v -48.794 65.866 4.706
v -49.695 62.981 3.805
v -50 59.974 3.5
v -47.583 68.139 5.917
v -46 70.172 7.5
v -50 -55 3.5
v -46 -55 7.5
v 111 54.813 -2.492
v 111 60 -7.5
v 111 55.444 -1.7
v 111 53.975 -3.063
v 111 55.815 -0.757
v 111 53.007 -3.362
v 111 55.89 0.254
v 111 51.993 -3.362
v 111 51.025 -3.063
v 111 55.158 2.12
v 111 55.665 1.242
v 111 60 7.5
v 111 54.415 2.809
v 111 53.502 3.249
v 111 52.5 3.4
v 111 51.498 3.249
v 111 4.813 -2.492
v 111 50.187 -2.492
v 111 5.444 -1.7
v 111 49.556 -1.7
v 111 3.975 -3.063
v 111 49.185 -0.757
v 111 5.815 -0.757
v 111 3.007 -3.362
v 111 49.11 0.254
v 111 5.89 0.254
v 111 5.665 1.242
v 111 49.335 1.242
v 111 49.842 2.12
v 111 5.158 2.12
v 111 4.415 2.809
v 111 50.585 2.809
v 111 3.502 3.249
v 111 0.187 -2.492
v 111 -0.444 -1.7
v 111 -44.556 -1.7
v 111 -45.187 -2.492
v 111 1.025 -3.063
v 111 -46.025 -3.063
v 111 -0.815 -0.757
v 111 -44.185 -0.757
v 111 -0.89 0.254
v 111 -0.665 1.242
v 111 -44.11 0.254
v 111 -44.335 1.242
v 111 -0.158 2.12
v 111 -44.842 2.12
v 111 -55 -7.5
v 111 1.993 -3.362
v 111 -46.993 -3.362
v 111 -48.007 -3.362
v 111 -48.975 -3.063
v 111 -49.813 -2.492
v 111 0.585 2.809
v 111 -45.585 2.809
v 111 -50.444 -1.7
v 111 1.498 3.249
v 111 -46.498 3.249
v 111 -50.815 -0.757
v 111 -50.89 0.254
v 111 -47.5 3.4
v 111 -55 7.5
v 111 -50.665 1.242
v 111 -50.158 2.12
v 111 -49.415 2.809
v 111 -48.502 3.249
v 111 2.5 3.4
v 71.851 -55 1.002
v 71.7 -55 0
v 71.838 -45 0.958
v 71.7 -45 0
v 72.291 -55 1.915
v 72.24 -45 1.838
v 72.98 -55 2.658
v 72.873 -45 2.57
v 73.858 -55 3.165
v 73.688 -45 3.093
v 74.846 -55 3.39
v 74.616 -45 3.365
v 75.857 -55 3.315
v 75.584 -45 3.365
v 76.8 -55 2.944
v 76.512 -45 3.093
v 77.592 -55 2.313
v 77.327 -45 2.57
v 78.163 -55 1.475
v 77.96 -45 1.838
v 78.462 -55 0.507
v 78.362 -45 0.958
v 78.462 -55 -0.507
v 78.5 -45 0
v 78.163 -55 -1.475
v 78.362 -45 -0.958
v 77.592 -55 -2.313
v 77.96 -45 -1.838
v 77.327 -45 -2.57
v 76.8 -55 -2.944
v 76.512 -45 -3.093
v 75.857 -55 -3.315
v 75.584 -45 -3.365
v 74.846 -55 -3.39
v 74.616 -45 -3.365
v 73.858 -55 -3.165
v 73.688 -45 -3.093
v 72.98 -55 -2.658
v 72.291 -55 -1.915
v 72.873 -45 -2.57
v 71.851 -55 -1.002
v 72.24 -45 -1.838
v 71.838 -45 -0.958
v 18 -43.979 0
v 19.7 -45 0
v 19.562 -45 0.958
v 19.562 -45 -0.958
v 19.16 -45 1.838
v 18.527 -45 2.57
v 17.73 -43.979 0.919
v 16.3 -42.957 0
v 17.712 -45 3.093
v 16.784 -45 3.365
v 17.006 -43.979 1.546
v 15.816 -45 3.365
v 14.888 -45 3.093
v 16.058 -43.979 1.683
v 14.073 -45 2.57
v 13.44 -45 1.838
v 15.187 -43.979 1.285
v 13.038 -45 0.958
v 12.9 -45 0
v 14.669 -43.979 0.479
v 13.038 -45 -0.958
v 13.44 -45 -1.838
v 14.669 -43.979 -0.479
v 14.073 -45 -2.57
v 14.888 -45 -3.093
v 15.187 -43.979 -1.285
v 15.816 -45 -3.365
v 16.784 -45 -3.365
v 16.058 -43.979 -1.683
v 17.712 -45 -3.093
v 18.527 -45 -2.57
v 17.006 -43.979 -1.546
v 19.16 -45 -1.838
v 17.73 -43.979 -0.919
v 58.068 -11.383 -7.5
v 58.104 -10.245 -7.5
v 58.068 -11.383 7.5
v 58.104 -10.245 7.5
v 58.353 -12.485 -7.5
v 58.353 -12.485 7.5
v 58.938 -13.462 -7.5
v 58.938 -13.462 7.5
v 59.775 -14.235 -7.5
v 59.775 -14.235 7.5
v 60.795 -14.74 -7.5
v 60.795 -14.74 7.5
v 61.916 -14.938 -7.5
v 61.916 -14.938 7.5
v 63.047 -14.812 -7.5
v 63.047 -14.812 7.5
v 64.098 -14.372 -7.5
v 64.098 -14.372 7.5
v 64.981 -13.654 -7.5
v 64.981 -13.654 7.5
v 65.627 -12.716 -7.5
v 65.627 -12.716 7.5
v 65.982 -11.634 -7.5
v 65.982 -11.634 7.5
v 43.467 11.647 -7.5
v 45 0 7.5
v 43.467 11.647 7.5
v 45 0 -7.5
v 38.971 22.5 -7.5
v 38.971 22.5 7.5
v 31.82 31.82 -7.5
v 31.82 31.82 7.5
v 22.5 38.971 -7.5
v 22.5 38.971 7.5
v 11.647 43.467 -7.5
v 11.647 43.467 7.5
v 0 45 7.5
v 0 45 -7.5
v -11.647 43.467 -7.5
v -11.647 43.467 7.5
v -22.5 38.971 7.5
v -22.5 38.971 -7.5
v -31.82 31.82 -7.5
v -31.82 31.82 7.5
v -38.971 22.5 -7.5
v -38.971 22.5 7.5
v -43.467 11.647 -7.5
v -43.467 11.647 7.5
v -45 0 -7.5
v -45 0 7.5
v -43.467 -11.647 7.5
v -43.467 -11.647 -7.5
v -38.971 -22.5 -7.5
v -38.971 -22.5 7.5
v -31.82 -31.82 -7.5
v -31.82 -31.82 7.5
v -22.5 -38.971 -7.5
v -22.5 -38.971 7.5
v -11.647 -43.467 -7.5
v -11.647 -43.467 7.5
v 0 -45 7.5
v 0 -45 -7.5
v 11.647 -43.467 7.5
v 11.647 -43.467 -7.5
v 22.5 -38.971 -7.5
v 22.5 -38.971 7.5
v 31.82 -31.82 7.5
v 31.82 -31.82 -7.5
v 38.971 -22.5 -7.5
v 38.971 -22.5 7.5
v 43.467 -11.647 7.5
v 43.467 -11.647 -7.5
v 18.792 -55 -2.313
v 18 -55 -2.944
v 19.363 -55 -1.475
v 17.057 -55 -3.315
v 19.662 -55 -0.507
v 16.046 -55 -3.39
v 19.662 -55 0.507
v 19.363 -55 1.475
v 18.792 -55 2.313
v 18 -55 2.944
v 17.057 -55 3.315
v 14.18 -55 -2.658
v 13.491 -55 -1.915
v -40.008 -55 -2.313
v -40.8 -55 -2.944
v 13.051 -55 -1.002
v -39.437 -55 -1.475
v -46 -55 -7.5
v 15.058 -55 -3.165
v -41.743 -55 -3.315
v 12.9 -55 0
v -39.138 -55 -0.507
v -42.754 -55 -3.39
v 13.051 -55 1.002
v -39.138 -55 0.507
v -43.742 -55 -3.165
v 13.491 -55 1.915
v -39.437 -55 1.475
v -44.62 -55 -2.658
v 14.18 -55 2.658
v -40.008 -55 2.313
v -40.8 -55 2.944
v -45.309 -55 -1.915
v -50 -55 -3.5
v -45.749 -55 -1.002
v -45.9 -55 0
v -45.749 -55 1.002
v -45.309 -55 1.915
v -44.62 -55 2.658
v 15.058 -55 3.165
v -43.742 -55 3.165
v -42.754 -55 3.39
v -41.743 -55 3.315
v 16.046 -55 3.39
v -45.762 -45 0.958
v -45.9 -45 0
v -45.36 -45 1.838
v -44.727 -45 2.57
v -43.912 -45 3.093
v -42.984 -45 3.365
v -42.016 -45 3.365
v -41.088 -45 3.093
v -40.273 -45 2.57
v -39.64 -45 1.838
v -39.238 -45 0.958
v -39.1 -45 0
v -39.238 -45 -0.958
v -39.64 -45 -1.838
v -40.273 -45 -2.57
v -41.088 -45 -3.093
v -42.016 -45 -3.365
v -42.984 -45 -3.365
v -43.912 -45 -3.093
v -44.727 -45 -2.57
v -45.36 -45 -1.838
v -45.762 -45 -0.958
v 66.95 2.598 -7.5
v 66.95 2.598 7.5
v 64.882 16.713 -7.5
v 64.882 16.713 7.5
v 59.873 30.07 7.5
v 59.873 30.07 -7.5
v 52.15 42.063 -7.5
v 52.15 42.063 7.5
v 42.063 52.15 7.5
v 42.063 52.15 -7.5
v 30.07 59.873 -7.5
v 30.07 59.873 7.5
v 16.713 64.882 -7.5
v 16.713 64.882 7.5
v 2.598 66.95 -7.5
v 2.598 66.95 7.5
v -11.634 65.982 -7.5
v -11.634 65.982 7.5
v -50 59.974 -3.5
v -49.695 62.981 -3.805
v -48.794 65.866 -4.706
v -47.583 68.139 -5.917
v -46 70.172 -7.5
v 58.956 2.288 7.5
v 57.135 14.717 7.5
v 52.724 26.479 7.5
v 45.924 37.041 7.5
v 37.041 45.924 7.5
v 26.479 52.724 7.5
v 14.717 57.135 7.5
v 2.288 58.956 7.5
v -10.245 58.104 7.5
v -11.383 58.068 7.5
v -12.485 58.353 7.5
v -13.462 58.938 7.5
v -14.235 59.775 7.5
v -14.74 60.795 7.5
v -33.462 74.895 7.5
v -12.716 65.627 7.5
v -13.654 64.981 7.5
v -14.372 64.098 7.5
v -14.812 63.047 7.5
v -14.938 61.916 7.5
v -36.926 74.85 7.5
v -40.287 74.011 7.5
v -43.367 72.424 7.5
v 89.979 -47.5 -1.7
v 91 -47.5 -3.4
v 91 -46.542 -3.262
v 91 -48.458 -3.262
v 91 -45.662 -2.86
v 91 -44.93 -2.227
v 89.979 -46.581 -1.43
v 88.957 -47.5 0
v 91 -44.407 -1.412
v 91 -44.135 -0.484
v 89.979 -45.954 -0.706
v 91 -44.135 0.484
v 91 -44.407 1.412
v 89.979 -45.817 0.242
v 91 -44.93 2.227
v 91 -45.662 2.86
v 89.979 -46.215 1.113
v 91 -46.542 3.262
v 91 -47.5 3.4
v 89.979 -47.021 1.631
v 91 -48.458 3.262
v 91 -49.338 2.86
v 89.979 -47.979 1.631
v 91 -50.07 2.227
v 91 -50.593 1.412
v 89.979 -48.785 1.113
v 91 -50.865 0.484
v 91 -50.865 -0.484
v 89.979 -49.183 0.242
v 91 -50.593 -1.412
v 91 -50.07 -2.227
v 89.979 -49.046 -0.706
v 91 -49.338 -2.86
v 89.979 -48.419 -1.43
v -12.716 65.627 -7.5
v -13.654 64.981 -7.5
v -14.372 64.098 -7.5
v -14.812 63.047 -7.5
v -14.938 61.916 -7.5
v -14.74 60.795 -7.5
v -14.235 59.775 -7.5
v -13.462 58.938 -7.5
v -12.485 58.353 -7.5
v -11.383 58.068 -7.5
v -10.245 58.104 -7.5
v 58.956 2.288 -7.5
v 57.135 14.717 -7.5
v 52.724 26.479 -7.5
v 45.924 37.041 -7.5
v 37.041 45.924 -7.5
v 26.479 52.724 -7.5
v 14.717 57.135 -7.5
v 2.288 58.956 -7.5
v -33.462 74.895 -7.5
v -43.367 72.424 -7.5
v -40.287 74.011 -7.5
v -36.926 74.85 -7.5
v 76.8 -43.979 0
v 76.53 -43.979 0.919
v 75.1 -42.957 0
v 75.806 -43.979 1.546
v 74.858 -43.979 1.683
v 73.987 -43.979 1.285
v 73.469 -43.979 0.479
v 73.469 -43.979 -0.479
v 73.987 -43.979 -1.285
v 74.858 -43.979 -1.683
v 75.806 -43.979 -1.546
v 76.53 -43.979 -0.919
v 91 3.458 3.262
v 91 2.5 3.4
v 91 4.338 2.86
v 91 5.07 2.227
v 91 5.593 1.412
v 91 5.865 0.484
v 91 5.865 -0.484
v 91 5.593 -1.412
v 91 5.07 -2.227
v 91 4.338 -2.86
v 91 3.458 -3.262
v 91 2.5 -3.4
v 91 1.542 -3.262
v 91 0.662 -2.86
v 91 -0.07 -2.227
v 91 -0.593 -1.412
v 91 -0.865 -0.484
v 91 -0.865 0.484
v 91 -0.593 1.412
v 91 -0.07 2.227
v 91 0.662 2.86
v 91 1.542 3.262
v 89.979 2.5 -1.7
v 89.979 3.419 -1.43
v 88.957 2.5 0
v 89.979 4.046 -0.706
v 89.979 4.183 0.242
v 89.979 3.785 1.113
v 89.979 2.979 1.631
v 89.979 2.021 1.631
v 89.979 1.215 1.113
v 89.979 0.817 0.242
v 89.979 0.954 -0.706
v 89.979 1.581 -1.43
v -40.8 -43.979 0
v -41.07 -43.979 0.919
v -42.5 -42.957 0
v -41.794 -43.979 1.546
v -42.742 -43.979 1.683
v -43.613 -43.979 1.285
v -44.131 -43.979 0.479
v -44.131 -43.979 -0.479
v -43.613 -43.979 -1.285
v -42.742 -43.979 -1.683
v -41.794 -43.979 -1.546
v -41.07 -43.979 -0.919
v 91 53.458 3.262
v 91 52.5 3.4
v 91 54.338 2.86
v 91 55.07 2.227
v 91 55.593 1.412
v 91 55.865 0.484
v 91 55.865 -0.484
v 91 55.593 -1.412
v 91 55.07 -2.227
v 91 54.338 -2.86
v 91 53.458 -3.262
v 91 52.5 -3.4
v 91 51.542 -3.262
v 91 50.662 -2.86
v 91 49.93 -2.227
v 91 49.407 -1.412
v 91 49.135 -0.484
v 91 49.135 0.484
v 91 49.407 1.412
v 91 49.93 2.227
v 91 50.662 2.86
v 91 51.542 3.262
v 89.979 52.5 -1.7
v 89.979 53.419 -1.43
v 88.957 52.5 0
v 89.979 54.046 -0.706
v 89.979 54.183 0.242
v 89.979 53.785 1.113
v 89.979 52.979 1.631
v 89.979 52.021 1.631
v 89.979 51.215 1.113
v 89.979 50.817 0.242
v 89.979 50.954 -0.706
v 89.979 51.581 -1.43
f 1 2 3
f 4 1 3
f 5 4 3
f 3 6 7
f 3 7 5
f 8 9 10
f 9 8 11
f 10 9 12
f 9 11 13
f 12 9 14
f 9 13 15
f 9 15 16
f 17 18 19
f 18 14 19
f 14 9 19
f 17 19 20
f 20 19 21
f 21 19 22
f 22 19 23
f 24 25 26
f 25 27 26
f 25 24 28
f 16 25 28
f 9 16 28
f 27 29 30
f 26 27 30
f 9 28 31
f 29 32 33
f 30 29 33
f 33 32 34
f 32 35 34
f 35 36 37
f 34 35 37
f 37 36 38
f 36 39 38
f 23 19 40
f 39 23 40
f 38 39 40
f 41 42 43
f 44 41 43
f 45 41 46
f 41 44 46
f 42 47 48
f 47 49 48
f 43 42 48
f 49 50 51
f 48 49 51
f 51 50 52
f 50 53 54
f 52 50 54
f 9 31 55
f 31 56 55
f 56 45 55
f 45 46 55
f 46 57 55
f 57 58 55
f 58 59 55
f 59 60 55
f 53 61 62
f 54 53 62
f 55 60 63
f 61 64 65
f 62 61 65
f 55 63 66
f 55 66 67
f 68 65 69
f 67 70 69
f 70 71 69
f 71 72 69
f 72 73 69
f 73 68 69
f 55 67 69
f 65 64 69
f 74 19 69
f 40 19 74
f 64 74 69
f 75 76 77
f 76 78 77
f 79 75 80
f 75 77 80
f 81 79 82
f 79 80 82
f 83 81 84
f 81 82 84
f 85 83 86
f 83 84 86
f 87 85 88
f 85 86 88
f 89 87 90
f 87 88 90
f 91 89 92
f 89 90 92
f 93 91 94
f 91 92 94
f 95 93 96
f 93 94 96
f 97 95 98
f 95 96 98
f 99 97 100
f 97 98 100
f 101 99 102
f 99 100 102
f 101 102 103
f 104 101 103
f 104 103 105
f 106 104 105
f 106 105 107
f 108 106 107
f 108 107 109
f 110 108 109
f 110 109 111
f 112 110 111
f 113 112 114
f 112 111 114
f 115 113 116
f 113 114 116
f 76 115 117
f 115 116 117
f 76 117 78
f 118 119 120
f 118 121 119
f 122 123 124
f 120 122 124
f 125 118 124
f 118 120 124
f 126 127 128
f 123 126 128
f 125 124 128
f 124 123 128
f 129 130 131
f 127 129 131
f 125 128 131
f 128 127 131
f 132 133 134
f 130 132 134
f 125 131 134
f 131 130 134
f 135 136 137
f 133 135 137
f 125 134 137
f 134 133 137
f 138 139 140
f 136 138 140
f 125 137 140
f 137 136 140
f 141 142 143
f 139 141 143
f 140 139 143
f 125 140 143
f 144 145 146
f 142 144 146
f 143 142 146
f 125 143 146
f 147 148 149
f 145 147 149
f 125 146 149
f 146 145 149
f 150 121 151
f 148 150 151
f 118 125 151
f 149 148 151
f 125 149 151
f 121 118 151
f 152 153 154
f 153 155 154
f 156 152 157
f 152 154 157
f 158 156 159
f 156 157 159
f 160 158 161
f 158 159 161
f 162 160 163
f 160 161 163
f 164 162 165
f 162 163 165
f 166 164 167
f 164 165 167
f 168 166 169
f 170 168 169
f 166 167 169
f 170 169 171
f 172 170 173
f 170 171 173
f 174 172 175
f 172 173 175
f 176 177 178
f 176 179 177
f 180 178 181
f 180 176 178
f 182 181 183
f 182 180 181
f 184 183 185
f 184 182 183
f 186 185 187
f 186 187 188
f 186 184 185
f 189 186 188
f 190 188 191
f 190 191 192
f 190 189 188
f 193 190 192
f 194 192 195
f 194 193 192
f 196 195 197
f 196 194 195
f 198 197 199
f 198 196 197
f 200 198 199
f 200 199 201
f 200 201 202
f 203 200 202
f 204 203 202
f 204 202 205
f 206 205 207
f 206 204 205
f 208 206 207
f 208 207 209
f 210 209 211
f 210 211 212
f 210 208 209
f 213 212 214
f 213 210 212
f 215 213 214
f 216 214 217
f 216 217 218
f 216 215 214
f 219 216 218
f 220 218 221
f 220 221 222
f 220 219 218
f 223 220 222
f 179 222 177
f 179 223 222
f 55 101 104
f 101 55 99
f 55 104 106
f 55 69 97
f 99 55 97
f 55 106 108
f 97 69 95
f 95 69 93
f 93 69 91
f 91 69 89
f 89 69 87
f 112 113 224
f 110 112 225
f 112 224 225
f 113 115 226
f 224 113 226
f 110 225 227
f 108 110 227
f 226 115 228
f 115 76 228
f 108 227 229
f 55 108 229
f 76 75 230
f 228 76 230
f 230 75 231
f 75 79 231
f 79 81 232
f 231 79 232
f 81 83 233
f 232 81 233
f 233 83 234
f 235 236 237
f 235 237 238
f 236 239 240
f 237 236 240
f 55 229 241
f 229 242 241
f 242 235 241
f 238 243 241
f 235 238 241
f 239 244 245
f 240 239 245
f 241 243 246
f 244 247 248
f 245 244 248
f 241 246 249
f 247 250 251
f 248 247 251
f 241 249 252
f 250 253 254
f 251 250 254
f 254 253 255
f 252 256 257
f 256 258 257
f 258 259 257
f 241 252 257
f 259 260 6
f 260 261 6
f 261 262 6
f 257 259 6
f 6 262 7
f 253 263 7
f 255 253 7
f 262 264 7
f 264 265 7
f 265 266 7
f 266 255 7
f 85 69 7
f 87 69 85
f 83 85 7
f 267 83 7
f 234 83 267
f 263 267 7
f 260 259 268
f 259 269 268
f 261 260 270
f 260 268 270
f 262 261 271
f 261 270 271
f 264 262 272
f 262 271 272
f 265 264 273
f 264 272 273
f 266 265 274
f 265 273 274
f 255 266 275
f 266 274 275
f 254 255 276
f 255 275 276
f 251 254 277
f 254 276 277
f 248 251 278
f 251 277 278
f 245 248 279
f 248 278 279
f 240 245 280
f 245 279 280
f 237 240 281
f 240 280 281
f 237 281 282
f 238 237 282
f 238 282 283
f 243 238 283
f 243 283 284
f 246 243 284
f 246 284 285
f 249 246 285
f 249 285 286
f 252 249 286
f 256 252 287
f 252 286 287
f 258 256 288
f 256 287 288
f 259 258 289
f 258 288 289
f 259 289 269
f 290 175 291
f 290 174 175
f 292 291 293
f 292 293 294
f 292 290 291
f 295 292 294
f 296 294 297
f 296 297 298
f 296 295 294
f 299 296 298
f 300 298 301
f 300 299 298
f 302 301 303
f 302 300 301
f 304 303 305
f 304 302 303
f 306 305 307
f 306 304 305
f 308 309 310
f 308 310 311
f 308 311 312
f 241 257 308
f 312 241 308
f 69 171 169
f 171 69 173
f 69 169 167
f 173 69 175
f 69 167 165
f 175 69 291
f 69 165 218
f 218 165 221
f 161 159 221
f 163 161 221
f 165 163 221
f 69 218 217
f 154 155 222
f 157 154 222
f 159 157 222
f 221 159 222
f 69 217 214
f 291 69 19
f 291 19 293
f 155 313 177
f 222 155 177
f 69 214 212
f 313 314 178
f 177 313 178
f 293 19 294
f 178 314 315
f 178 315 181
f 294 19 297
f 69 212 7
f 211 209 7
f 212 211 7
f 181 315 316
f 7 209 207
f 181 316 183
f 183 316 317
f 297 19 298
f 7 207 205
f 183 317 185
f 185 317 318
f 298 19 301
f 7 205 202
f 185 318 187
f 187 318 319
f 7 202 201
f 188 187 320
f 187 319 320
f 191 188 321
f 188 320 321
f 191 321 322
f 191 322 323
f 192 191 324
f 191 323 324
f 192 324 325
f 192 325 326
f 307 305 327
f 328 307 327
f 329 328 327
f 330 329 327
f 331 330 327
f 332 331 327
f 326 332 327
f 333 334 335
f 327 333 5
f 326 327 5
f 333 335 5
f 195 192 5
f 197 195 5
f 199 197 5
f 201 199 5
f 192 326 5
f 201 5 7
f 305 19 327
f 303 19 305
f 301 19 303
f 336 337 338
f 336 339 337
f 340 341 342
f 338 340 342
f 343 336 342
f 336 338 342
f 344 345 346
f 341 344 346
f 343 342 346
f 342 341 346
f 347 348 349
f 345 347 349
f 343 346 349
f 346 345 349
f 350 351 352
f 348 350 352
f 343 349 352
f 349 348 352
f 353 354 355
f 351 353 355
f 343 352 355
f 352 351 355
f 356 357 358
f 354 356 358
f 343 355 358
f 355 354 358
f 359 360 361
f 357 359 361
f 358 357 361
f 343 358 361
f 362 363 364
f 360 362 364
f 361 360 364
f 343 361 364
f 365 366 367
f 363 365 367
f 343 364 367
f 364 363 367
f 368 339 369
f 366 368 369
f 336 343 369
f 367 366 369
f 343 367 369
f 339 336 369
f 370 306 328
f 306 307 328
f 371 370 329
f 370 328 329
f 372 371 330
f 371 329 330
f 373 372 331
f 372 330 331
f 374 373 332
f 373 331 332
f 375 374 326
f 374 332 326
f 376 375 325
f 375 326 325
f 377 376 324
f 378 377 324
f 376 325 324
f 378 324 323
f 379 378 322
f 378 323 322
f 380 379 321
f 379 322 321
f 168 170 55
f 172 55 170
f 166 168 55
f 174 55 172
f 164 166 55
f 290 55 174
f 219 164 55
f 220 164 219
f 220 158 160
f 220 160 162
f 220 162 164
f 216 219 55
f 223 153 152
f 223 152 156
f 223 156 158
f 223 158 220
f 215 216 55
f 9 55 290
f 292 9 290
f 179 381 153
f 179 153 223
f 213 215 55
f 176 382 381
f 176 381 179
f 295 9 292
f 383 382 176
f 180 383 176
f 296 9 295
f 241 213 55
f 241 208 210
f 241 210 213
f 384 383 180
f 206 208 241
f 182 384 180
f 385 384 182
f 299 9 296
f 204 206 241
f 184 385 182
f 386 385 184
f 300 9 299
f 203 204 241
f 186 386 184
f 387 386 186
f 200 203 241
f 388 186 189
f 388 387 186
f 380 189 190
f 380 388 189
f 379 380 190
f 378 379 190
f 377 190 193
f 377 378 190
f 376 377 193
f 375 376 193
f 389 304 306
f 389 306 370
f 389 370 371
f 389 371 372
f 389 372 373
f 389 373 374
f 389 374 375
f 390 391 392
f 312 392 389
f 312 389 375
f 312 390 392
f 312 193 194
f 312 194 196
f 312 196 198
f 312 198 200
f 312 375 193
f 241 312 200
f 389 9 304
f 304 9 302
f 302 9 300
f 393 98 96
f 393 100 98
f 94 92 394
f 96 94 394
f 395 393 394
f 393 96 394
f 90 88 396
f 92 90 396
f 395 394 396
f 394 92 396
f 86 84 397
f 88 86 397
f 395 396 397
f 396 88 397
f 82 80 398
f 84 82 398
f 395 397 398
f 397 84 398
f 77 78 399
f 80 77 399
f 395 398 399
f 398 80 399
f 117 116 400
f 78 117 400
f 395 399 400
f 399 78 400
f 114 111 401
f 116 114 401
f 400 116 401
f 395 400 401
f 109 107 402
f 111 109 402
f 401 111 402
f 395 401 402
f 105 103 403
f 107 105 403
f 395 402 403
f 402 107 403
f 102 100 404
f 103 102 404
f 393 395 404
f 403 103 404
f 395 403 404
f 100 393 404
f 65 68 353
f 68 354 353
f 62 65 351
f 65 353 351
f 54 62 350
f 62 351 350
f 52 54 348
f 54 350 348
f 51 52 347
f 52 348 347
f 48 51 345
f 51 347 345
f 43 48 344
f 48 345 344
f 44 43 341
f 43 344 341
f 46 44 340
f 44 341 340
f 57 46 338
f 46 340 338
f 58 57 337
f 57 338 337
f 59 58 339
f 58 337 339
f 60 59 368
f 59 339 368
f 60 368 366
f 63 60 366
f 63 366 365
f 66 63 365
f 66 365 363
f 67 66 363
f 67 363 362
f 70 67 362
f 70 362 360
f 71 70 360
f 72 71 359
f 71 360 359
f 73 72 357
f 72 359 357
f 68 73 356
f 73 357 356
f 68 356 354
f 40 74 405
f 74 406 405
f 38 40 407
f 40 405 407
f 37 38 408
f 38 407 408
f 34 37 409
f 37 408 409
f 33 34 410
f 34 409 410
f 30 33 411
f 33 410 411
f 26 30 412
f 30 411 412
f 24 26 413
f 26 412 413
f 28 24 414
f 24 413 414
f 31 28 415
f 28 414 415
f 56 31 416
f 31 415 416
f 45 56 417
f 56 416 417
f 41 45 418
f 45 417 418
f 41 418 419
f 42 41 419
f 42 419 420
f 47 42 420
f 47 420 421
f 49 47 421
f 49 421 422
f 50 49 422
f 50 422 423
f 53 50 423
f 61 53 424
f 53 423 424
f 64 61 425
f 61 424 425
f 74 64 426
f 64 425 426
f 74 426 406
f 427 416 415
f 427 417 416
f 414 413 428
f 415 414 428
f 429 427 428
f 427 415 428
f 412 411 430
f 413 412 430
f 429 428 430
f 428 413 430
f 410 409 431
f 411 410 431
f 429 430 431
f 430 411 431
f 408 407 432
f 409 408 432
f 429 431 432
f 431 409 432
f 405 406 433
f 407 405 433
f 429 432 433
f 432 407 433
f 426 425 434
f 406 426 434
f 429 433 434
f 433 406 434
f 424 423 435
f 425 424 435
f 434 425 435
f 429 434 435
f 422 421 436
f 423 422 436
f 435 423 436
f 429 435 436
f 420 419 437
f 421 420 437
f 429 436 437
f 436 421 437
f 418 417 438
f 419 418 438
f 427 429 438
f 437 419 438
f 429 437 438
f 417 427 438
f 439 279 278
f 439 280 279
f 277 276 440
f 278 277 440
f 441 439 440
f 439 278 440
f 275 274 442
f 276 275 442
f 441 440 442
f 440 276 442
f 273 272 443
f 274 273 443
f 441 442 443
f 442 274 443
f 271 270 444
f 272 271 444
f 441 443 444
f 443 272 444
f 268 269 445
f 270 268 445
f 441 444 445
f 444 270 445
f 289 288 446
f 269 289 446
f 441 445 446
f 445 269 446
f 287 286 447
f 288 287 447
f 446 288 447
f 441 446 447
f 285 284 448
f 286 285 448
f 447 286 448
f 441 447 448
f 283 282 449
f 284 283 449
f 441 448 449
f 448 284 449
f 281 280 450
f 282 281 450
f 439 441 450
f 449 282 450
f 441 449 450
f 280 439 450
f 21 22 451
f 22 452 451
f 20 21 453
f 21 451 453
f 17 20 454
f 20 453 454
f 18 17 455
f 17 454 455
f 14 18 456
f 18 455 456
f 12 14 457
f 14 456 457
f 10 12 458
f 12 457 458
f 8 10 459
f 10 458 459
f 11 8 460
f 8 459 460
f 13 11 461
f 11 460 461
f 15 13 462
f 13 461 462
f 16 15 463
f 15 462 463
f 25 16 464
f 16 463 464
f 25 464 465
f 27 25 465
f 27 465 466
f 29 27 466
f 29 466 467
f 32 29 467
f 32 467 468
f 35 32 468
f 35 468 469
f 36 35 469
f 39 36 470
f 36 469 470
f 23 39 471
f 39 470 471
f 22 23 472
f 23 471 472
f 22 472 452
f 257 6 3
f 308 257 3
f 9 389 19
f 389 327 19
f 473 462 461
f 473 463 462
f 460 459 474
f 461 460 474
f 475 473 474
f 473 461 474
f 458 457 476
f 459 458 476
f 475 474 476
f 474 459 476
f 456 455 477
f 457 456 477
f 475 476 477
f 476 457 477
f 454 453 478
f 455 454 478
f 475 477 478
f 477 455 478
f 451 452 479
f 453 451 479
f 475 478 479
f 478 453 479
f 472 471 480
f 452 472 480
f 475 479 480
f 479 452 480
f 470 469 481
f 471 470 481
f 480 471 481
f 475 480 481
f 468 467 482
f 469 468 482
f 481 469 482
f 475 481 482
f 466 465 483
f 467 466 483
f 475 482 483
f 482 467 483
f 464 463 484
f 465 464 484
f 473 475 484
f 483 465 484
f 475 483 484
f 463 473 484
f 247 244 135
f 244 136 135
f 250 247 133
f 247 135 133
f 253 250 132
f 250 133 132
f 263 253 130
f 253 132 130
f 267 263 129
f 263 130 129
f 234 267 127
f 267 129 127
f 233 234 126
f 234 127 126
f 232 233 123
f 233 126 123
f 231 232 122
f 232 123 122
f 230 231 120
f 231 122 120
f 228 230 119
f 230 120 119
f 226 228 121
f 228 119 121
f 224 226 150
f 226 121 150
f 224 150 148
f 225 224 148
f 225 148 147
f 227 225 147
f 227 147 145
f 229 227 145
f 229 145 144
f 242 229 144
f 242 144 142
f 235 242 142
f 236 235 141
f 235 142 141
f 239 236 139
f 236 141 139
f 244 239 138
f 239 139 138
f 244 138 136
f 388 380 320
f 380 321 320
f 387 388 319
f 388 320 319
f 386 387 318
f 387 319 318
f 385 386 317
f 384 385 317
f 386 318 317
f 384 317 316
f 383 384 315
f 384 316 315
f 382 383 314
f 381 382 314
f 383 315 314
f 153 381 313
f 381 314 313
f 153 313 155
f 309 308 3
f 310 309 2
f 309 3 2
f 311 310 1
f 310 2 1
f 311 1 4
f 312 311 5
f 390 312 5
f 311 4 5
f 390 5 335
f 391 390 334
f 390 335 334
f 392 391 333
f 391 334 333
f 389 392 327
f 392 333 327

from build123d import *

# Parameters (mm, degrees)
CROQUIS1_R                = 45
SALIENTE_EXTRUIR1_DEPTH   = 7.5
TALADRO_ROSCADO_M81_D     = 6.8
TALADRO_ROSCADO_M81_DEPTH = 20
TALADRO_ROSCADO_M81_TIP   = 2.042926105
TALADRO_ROSCADO_M82_D     = 6.8
TALADRO_ROSCADO_M82_DEPTH = 10
TALADRO_ROSCADO_M82_TIP   = 2.042926105
CORTAR_EXTRUIR1_DEPTH     = 167.9


with BuildPart() as part:
    # Croquis1 → Saliente-Extruir1 (new body, symmetric)
    with BuildSketch(Plane.XY):
        with BuildLine():
            Line((-50, -55), (-50, 59.973896209))
            ThreePointArc((-50, 59.973896209), (-45.047974372, 71.111140529), (-33.461571863, 74.894795608))
            Line((-33.461571863, 74.894795608), (111, 60))
            Line((111, 60), (111, -55))
            Line((111, -55), (-50, -55))
        make_face()
        Circle(CROQUIS1_R, mode=Mode.SUBTRACT)
        with BuildLine():
            ThreePointArc((65.982119452, -11.634427904), (47.376154339, 47.376154339), (-11.634427904, 65.982119452))
            ThreePointArc((-11.634427904, 65.982119452), (-14.879066205, 61.348295729), (-10.245242482, 58.103657428))
            ThreePointArc((-10.245242482, 58.103657428), (41.71930009, 41.71930009), (58.103657428, -10.245242482))
            ThreePointArc((58.103657428, -10.245242482), (61.348295729, -14.879066205), (65.982119452, -11.634427904))
        make_face(mode=Mode.SUBTRACT)
    extrude(amount=SALIENTE_EXTRUIR1_DEPTH, both=True)

    # Taladro roscado M81
    with Locations(Plane(origin=(111, 0, 0), x_dir=(0, 0, -1), z_dir=(1, 0, 0))):
        with Locations((0, 52.5), (0, 2.5), (0, -47.5)):
            Hole(TALADRO_ROSCADO_M81_D / 2, depth=TALADRO_ROSCADO_M81_DEPTH)
            with Locations((0, 0, -(TALADRO_ROSCADO_M81_DEPTH + TALADRO_ROSCADO_M81_TIP / 2))):  # 118° drill point
                Cone(0, TALADRO_ROSCADO_M81_D / 2, TALADRO_ROSCADO_M81_TIP, mode=Mode.SUBTRACT)

    # Taladro roscado M82
    with Locations(Plane.XZ.offset(55)):
        with Locations((-42.5, 0), (16.3, 0), (75.1, 0)):
            Hole(TALADRO_ROSCADO_M82_D / 2, depth=TALADRO_ROSCADO_M82_DEPTH)
            with Locations((0, 0, -(TALADRO_ROSCADO_M82_DEPTH + TALADRO_ROSCADO_M82_TIP / 2))):  # 118° drill point
                Cone(0, TALADRO_ROSCADO_M82_D / 2, TALADRO_ROSCADO_M82_TIP, mode=Mode.SUBTRACT)

    # Croquis7 → Cortar-Extruir1 (cut)
    with BuildSketch(Plane.XZ.offset(55)):
        Polygon((-50, 7.5), (-50, 3.5), (-46, 7.5), align=None)
        Polygon((-50, -7.5), (-50, -3.5), (-46, -7.5), align=None)
    extrude(amount=-CORTAR_EXTRUIR1_DEPTH, mode=Mode.SUBTRACT)


solid = part.part
